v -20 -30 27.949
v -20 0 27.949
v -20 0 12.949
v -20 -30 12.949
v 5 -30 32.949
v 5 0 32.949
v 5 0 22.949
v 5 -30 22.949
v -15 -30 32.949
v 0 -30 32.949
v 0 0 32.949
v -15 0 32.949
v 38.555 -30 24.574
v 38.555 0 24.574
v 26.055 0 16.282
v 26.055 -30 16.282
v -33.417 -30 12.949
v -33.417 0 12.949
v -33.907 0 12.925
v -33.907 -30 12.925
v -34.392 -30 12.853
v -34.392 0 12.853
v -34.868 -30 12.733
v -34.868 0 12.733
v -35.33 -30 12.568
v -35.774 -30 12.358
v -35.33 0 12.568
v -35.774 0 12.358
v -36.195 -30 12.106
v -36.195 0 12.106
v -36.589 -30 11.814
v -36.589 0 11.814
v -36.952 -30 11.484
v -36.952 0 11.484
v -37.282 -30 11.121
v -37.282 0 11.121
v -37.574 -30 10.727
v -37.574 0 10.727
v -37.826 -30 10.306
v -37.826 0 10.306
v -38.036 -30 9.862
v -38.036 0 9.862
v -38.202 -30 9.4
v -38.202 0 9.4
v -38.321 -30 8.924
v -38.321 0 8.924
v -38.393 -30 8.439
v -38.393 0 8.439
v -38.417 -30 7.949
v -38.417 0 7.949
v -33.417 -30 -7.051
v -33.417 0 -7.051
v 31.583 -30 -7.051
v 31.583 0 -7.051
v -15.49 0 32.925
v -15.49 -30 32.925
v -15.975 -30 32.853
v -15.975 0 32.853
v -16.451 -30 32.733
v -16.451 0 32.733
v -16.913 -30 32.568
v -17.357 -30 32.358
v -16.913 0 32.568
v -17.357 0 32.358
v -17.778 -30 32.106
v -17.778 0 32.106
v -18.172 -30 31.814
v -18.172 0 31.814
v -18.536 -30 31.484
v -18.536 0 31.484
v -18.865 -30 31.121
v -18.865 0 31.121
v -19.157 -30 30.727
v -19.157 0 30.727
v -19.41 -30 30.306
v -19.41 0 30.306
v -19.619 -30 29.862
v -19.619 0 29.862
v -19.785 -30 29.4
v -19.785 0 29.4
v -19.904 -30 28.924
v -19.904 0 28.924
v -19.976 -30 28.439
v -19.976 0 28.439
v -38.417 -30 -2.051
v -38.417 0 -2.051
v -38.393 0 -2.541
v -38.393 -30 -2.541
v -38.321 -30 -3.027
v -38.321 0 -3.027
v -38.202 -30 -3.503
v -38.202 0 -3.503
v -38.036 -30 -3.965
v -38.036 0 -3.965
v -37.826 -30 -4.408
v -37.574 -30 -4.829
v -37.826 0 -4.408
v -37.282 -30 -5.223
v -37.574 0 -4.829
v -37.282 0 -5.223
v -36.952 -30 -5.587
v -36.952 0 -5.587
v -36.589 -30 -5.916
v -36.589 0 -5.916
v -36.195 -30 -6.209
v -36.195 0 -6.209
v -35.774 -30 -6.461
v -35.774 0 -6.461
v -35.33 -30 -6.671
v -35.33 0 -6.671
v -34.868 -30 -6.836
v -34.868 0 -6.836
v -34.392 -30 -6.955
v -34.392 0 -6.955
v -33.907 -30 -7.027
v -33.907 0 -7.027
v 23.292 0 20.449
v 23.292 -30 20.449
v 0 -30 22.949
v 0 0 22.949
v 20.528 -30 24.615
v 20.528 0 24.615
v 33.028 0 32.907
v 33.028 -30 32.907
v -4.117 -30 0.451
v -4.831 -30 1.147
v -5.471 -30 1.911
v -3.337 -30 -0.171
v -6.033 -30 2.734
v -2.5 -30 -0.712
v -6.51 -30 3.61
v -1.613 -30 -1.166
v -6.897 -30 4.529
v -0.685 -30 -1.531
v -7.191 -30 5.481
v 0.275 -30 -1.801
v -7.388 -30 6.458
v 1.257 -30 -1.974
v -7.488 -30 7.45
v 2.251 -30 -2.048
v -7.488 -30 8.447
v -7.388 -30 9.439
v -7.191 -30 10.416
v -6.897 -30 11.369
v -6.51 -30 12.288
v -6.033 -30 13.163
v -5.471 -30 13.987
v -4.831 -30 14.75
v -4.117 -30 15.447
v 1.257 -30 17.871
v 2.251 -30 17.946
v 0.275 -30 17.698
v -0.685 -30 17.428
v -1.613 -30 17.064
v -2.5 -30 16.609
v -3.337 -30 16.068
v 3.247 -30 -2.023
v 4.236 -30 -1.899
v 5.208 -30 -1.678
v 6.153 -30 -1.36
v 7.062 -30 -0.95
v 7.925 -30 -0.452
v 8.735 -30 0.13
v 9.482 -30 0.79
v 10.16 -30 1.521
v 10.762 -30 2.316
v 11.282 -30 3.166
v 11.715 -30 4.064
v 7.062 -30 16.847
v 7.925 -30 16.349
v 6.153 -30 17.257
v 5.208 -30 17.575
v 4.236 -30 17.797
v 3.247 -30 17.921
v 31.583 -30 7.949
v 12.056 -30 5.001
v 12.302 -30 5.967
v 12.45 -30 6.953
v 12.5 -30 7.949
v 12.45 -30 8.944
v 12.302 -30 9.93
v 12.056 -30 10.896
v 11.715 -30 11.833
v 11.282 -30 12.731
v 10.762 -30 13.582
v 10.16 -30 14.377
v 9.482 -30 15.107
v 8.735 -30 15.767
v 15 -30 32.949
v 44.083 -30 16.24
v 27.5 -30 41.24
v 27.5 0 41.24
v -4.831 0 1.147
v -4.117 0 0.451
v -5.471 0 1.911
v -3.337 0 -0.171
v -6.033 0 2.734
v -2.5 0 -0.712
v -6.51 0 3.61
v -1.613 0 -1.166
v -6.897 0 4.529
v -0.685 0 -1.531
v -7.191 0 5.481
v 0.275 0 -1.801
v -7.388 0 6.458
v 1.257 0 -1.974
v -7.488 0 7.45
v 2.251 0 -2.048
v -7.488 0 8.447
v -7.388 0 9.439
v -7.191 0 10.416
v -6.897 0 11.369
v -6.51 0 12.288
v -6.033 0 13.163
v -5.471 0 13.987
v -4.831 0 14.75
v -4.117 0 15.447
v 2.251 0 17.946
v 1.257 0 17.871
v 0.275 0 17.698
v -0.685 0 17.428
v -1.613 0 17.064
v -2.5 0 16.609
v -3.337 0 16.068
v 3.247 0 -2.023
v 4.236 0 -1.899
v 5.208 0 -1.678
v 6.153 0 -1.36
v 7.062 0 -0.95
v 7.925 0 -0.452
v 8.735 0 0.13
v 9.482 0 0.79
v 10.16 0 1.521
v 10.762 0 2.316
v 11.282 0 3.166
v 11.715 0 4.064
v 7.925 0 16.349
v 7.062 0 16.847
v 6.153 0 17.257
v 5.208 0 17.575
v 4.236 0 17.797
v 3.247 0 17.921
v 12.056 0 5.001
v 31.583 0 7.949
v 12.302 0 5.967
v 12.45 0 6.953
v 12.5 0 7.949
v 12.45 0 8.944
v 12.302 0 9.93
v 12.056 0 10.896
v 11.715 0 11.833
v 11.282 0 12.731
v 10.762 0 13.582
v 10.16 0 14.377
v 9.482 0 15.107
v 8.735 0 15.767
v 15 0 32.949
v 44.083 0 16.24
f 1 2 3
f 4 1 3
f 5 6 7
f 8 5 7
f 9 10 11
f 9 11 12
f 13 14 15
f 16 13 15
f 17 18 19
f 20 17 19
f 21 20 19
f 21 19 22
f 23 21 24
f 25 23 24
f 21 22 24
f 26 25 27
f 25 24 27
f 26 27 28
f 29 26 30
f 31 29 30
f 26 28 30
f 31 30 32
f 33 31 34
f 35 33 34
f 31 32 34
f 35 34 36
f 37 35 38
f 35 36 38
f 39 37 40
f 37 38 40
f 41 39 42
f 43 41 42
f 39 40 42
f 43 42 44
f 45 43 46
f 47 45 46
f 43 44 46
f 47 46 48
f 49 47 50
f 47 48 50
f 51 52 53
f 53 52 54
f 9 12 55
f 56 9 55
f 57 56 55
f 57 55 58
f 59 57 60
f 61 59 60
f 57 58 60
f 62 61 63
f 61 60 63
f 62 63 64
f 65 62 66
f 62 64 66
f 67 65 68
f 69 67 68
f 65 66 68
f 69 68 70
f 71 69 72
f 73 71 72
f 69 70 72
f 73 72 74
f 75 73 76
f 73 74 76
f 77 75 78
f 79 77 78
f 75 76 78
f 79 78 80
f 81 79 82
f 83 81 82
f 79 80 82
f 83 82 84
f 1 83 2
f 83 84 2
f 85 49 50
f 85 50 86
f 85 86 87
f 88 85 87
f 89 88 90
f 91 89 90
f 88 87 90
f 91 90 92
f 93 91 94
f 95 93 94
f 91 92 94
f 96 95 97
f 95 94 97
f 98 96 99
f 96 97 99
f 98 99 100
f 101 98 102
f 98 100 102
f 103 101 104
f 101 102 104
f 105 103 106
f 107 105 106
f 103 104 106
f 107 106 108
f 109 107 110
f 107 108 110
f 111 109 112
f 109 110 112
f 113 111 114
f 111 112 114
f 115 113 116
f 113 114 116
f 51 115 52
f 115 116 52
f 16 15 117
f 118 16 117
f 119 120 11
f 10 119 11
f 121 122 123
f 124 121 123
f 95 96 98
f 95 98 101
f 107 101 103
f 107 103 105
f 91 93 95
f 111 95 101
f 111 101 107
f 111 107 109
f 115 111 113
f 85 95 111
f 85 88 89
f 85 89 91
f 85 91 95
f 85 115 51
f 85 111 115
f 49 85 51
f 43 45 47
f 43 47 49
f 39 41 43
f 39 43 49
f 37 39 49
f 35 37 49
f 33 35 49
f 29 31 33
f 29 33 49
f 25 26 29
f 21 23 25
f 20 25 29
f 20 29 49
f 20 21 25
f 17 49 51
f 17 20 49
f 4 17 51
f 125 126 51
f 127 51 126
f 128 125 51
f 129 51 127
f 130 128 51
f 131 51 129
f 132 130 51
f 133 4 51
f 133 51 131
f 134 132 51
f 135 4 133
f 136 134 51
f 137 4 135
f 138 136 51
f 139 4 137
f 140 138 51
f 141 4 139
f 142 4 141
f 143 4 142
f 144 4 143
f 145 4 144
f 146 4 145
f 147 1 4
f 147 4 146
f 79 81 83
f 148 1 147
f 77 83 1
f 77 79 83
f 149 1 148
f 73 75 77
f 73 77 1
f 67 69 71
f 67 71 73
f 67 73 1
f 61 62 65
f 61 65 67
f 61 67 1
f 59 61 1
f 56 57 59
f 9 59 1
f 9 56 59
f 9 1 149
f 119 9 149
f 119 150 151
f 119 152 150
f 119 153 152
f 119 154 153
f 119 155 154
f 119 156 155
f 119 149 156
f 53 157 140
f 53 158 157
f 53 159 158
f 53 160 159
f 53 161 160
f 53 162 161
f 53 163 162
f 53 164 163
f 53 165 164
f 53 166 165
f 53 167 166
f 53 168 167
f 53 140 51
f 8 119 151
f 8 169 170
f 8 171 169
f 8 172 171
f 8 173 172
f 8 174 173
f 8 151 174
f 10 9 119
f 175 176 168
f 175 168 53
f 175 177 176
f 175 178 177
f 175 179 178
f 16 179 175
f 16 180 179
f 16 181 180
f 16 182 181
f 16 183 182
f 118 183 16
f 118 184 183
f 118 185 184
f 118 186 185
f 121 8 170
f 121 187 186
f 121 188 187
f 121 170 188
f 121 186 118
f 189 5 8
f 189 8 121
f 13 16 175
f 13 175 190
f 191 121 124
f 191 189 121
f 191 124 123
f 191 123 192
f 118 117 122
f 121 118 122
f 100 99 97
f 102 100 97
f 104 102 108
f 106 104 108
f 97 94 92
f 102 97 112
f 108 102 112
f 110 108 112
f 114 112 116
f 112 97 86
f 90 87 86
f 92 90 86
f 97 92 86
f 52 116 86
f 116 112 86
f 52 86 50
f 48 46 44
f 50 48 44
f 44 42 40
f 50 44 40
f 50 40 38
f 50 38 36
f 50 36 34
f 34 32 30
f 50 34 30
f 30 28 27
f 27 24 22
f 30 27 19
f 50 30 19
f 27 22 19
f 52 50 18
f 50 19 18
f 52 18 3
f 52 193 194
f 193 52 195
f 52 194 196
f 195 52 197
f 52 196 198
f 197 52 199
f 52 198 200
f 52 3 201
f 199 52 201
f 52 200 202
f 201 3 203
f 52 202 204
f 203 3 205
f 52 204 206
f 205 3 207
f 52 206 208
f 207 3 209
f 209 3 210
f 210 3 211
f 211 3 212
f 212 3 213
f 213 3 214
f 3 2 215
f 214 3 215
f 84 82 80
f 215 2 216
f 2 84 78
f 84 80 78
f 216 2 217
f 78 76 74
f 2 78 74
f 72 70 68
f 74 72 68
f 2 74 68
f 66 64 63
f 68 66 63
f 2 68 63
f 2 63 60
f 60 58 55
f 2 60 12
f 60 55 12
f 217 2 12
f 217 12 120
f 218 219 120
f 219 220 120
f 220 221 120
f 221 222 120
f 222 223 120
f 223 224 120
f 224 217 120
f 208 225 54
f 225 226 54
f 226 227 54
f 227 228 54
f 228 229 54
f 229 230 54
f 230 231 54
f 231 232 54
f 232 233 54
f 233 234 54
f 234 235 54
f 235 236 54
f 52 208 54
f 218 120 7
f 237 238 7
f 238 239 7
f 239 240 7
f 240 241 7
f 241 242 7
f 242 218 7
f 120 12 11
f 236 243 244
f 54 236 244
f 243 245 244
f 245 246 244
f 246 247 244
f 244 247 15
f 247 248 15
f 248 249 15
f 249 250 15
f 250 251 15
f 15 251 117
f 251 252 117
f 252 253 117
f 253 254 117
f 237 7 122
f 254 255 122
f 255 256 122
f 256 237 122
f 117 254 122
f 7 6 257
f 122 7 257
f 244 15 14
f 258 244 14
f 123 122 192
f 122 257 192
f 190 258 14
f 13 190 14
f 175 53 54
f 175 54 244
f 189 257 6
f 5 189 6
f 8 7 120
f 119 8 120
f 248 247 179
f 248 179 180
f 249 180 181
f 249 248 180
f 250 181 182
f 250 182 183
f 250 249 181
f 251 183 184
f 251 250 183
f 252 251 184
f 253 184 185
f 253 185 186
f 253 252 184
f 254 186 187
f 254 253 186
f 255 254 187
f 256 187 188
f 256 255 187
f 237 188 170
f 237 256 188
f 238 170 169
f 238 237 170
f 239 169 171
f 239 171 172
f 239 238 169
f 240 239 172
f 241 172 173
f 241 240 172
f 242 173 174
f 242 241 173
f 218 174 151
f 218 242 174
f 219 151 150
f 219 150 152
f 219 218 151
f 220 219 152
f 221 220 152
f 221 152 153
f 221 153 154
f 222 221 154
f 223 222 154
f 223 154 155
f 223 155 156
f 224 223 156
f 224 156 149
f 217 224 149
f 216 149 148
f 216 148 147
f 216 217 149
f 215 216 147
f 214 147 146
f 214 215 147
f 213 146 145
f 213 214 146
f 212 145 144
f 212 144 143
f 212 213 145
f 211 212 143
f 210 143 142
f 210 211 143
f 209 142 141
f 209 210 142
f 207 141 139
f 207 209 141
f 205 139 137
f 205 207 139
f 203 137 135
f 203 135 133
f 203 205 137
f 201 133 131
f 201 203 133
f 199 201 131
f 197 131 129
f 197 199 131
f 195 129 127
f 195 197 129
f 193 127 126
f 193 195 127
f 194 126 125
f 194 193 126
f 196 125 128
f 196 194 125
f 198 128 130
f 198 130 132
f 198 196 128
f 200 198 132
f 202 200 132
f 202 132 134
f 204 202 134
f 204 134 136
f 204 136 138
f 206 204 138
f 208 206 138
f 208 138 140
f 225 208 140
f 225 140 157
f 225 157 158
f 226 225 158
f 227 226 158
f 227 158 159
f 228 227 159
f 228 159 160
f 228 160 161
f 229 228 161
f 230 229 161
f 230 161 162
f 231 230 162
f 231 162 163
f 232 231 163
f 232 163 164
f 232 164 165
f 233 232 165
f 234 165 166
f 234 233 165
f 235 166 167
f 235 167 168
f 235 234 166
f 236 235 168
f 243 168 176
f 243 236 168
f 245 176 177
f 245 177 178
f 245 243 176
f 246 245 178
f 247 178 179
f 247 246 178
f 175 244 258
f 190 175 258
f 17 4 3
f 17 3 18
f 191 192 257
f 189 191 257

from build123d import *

# Parameters (mm, degrees)
F0_R     = 10
F1_DEPTH = 30


with BuildPart() as f1:
    # F0 (on Front) → F1 (new body)
    with BuildSketch(Plane.XZ):
        with BuildLine():
            Line((27.499998, 41.240266), (15, 32.948701))
            Line((15, 32.948701), (5, 32.948701))
            Line((5, 32.948701), (5, 22.948701))
            Line((5, 22.948701), (0, 22.948701))
            Line((0, 22.948701), (0, 32.948701))
            Line((0, 32.948701), (-15, 32.948701))
            ThreePointArc((-15, 32.948701), (-18.535534, 31.484235), (-20, 27.948701))
            Line((-20, 27.948701), (-20, 12.948702))
            Line((-20, 12.948702), (-33.41687, 12.948702))
            ThreePointArc((-33.41687, 12.948702), (-36.952404, 11.484236), (-38.41687, 7.948702))
            Line((-38.41687, 7.948702), (-38.41687, -2.051296))
            ThreePointArc((-38.41687, -2.051296), (-36.952404, -5.58683), (-33.41687, -7.051296))
            Line((-33.41687, -7.051296), (31.58313, -7.051296))
            Line((31.58313, -7.051296), (31.58313, 7.948704))
            Line((31.58313, 7.948704), (44.083128, 16.240268))
            Line((44.083128, 16.240268), (38.555418, 24.5736))
            Line((38.555418, 24.5736), (26.05542, 16.282036))
            Line((26.05542, 16.282036), (23.291564, 20.448704))
            Line((23.291564, 20.448704), (20.52771, 24.615369))
            Line((20.52771, 24.615369), (33.027708, 32.906933))
            Line((33.027708, 32.906933), (27.499998, 41.240266))
        make_face()
        with Locations((2.5, 7.948704)):
            Circle(F0_R, mode=Mode.SUBTRACT)
    extrude(amount=F1_DEPTH)


solid = f1.part
